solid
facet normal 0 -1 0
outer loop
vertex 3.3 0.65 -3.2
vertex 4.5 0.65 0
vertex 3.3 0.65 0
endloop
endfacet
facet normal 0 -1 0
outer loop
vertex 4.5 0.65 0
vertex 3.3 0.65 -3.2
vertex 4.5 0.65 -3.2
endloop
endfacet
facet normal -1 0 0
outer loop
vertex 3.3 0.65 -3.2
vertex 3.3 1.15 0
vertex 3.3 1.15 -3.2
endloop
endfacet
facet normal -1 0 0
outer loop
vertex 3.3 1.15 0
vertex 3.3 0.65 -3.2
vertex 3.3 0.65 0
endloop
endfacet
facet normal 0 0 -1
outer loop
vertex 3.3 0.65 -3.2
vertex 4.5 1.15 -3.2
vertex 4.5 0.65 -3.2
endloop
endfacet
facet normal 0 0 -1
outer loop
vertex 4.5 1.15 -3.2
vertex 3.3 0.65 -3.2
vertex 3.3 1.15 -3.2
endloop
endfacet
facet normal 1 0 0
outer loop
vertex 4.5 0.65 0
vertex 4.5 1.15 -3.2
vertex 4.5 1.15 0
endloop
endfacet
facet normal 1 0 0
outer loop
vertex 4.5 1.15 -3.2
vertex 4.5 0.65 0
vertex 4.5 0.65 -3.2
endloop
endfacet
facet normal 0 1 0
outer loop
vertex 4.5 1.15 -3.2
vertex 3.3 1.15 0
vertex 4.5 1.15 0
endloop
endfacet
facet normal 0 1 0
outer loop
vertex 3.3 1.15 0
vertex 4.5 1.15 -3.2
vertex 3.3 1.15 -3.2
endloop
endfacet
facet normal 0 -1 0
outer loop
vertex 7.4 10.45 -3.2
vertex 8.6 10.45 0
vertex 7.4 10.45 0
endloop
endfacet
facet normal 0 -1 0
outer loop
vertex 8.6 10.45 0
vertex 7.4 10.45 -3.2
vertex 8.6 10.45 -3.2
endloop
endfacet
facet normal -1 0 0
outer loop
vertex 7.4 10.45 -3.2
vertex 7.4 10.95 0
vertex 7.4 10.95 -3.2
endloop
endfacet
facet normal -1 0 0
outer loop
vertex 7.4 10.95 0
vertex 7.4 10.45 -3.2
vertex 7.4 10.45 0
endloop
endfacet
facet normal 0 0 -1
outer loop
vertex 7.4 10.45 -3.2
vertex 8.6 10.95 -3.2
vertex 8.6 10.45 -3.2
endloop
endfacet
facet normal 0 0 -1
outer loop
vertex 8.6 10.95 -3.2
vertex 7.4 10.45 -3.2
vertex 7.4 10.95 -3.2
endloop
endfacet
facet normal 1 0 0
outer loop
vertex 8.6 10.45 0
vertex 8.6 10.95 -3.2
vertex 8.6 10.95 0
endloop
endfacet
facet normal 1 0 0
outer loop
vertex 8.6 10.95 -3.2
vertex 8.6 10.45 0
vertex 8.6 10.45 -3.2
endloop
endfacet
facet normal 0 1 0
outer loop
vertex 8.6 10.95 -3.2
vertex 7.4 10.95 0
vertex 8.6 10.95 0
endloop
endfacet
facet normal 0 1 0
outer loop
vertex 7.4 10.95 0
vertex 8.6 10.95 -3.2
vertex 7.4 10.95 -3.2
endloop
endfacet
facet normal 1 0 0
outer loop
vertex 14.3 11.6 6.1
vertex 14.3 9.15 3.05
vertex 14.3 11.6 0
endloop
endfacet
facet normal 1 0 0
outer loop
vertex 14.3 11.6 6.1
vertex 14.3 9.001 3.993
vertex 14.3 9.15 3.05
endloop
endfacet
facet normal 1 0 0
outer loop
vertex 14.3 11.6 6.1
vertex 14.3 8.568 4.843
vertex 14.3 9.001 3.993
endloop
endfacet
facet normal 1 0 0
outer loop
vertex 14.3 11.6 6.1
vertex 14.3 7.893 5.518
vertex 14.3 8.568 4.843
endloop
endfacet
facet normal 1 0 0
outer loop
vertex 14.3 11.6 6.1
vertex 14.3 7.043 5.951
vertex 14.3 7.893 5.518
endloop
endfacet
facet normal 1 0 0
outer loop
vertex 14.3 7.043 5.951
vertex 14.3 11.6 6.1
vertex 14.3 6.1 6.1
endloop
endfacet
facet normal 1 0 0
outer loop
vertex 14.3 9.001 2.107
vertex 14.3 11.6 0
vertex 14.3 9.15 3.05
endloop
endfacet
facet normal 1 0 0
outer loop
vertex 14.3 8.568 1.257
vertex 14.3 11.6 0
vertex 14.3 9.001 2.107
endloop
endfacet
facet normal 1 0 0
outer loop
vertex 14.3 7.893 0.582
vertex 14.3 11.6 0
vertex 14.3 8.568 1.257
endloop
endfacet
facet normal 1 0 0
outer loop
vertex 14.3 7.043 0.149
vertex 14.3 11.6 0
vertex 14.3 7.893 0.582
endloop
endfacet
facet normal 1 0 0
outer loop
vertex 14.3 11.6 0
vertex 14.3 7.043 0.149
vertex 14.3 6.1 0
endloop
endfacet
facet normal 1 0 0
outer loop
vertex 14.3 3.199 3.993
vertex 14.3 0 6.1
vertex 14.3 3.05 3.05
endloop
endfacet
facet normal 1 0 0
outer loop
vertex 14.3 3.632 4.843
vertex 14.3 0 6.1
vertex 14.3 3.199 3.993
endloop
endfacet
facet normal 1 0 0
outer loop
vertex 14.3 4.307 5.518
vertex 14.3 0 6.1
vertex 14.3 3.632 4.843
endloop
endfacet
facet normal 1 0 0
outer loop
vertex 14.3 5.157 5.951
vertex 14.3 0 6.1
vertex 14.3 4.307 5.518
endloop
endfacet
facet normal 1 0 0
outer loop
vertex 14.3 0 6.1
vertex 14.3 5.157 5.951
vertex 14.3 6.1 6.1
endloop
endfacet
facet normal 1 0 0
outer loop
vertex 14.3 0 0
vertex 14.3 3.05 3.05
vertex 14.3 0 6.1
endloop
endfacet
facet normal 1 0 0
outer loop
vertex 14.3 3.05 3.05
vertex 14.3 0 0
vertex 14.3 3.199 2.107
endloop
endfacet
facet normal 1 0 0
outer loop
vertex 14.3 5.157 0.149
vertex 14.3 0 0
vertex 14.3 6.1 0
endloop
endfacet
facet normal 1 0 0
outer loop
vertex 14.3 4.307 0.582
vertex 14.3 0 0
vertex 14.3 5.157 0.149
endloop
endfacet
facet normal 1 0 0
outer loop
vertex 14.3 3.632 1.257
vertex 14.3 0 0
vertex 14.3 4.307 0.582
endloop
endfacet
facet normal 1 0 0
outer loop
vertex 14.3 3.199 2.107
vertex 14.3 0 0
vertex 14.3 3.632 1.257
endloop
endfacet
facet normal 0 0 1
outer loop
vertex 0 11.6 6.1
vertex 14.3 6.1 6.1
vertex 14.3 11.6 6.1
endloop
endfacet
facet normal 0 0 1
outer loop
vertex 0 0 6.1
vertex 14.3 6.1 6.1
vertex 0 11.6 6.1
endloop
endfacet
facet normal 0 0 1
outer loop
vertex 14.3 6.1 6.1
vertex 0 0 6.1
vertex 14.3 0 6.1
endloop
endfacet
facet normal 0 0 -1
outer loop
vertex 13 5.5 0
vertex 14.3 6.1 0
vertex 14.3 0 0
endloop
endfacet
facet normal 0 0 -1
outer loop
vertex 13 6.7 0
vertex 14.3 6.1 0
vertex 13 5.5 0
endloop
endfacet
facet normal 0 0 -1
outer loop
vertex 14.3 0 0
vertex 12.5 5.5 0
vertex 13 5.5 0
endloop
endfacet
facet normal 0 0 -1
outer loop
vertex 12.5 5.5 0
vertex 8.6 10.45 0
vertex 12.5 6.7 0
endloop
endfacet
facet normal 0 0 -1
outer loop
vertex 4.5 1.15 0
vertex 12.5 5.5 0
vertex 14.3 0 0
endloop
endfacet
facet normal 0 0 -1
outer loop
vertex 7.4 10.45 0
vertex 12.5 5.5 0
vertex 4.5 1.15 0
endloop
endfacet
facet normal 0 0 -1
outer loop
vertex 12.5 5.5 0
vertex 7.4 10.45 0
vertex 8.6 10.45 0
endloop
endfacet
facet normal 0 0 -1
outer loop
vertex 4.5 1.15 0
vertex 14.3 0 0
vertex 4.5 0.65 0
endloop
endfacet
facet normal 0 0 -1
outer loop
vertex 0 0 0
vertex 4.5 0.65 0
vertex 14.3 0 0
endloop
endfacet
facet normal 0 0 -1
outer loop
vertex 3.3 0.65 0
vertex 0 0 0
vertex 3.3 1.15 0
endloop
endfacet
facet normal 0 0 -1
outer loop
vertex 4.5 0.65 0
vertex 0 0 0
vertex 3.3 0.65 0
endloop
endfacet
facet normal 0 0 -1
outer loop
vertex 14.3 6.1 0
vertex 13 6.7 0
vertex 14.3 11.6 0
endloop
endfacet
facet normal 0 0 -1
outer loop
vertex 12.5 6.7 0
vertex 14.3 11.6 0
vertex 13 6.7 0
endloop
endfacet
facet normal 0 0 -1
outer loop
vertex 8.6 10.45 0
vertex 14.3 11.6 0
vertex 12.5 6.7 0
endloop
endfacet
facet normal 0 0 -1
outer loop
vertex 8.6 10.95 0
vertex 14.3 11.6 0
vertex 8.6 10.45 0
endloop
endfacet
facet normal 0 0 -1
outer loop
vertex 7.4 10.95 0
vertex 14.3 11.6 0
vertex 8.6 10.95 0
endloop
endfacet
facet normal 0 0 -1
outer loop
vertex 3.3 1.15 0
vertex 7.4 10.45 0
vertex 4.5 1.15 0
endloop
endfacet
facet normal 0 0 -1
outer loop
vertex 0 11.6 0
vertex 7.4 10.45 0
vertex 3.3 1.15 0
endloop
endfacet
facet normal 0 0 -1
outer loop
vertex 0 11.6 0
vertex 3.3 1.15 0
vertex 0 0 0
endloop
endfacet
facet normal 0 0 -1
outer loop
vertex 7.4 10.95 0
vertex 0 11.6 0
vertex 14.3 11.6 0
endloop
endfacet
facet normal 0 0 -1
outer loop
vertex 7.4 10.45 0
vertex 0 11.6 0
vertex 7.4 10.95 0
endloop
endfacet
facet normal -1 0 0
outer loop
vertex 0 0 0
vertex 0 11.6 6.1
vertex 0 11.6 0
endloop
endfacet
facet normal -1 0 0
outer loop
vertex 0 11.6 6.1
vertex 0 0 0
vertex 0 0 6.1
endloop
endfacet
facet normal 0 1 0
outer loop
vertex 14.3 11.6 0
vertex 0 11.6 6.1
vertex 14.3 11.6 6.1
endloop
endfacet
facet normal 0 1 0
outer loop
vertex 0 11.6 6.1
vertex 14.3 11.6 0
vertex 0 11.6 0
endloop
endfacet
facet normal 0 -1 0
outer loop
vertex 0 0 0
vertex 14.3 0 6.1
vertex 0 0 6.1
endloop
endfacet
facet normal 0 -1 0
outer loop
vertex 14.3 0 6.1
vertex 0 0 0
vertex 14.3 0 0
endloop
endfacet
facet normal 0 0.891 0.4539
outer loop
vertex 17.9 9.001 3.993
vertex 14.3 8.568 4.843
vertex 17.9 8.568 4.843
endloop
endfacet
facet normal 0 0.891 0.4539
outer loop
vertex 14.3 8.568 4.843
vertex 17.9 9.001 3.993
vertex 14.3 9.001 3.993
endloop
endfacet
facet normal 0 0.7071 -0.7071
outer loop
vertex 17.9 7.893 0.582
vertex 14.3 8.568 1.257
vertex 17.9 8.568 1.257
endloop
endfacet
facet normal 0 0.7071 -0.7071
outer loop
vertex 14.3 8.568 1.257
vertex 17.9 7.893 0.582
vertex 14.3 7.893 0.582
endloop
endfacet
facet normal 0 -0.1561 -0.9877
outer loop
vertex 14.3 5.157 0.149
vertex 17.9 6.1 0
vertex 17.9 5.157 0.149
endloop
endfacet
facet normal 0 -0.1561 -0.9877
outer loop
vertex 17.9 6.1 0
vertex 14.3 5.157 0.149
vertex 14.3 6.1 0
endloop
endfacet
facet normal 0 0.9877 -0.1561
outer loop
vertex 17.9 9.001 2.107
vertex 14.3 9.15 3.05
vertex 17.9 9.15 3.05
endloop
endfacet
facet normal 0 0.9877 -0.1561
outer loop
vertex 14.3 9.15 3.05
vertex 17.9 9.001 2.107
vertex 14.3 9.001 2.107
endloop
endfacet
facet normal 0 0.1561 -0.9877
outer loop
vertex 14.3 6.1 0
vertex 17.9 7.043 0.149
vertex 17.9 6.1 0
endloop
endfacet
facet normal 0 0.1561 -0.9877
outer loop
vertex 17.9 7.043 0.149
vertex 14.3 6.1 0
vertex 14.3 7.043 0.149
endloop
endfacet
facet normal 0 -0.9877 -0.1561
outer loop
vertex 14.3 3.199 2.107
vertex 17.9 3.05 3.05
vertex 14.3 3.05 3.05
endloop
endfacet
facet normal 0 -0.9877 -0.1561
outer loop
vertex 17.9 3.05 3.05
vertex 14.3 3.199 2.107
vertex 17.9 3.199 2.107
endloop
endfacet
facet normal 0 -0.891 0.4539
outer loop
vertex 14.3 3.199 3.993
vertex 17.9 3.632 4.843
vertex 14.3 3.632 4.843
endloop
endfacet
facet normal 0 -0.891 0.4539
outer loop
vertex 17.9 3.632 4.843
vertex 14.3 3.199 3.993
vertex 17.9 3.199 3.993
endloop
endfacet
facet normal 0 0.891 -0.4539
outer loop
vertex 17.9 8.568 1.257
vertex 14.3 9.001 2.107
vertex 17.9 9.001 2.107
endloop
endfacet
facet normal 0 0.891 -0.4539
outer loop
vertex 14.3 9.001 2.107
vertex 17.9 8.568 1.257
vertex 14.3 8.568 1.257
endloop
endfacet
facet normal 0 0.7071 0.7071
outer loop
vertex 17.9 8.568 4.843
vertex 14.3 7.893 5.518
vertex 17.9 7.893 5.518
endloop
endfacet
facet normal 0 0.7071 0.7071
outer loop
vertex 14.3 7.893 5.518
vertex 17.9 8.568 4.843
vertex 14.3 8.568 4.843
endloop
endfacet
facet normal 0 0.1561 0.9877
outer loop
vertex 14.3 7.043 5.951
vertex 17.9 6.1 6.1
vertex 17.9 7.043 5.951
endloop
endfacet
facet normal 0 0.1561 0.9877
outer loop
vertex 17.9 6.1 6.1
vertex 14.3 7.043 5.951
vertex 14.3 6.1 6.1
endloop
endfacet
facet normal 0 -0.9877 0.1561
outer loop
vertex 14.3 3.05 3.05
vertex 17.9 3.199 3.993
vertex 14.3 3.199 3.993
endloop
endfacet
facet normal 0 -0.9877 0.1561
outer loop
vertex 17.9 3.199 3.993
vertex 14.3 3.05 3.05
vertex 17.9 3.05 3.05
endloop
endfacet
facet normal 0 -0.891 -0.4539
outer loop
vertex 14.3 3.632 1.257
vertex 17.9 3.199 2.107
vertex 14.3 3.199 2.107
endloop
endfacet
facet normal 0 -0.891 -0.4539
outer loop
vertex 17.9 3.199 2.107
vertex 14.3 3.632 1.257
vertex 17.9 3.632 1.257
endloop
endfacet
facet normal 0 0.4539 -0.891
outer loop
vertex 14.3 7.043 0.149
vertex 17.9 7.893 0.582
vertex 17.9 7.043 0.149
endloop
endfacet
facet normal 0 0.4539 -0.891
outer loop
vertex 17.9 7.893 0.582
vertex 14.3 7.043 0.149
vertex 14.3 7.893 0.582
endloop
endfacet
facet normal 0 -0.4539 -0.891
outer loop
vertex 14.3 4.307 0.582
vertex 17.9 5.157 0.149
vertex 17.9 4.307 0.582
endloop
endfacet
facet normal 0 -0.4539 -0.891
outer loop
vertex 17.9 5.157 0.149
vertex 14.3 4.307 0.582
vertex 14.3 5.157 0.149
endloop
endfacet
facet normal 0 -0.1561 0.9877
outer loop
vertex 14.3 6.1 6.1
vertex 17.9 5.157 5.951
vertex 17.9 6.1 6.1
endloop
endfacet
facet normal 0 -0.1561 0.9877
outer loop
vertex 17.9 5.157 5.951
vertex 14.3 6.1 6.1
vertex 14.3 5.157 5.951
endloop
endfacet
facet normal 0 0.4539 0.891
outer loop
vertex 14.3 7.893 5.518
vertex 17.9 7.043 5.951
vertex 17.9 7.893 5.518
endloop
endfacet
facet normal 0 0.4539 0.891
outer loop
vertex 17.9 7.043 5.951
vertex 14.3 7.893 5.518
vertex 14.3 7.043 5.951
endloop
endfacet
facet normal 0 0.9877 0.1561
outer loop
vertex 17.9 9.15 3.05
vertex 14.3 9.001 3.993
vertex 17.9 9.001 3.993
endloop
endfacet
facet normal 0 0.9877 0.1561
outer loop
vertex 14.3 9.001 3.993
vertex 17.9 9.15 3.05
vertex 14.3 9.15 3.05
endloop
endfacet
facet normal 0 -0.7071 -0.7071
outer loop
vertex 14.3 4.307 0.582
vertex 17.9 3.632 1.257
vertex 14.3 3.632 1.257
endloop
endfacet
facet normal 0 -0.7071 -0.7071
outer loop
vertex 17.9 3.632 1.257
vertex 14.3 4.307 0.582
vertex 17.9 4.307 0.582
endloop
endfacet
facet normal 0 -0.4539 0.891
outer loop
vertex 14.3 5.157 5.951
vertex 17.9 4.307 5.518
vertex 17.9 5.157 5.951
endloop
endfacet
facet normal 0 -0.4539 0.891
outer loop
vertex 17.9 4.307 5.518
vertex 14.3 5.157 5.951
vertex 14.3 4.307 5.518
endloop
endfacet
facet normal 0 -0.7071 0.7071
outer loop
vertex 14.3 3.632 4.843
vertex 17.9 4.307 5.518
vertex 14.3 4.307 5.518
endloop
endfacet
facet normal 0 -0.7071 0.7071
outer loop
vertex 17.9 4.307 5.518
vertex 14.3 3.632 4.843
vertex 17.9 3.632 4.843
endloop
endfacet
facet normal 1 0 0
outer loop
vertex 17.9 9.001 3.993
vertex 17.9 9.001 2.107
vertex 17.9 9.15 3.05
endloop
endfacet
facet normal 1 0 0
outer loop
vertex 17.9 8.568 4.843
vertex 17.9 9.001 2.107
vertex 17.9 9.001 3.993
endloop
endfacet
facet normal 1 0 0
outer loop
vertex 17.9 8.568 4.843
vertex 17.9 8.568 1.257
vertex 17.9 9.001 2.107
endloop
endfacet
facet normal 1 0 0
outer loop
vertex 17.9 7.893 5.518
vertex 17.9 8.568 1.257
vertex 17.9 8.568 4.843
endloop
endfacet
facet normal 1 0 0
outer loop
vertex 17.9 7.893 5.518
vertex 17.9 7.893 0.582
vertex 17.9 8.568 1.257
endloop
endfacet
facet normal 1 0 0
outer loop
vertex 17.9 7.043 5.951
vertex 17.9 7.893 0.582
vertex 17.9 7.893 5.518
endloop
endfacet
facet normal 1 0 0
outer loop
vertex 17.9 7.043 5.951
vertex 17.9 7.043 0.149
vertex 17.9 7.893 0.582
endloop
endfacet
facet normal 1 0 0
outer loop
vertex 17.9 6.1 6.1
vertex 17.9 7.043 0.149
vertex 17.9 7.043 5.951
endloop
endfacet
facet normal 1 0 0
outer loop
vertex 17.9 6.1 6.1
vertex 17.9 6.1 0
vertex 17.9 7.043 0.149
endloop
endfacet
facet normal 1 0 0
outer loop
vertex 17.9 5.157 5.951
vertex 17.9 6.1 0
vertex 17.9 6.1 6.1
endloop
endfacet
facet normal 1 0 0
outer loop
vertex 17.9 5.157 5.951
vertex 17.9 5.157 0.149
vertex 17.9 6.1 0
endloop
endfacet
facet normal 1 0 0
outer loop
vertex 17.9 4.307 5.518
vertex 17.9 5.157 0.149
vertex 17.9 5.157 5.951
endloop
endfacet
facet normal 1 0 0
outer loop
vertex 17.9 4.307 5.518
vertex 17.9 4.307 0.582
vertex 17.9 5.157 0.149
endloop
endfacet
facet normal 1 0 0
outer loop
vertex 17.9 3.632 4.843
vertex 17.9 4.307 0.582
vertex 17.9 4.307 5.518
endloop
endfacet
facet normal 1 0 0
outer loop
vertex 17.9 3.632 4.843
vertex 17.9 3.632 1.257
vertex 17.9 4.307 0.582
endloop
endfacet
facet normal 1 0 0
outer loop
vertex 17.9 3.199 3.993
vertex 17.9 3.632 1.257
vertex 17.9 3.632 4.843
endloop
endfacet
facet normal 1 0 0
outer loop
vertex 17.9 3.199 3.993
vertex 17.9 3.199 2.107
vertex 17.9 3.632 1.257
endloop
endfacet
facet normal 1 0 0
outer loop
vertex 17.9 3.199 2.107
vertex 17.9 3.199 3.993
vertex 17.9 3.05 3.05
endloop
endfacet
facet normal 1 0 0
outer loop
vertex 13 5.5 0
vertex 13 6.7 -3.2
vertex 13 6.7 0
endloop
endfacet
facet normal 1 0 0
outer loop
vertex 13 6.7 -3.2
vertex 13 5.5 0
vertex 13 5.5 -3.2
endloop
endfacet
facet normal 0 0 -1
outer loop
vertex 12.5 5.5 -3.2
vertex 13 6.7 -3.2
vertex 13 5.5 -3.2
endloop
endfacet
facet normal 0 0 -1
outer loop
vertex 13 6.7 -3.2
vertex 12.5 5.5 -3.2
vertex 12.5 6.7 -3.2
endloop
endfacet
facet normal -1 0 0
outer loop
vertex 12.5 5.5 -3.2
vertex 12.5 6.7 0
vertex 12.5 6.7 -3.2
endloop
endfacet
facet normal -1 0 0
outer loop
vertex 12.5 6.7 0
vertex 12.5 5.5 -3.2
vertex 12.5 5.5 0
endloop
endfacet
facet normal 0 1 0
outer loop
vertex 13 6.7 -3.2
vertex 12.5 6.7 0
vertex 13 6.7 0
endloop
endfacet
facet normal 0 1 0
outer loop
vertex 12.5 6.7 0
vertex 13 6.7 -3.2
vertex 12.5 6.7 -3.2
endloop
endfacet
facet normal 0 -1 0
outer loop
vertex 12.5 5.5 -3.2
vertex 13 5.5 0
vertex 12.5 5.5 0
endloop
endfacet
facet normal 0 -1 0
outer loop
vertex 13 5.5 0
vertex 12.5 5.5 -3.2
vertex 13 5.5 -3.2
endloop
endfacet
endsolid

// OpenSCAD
/*
    OpenPaddle

    Copyright (C) 2023  Matthias Jordan

    This program is free software: you can redistribute it and/or modify
    it under the terms of the GNU General Public License as published by
    the Free Software Foundation, either version 3 of the License, or
    (at your option) any later version.

    This program is distributed in the hope that it will be useful,
    but WITHOUT ANY WARRANTY; without even the implied warranty of
    MERCHANTABILITY or FITNESS FOR A PARTICULAR PURPOSE.  See the
    GNU General Public License for more details.

    You should have received a copy of the GNU General Public License
    along with this program.  If not, see <https://www.gnu.org/licenses/>.
*/    


//////////////////////////////////////////////////////////////////////
//
//
// A TRS jack type EBS35.
//
//
//////////////////////////////////////////////////////////////////////

ebs35();

module ebs35() {
    $fn=20;
    jackcyllen=3.6;
    len=14.3;
    cube([len, 11.6, 6.1]);
    
    pinthickness=0.5;
    pinwidth=1.2;
    pinheight=3.2;
    translate([len, (11.6-5.5), 6.1/2]) rotate([0, 90, 0]) cylinder(d=6.1, h=jackcyllen);
    
    translate([0, -pinthickness/2, 0]) {
        translate([17.9-13.4, 11.6-5.5-5.2, -3.2]) rotate([0, 0, 90]) color("red") cube([pinthickness, pinwidth, pinheight+0.01]);

        translate([17.9-9.3, 11.6-5.5+4.6, -3.2]) rotate([0, 0, 90]) color("red") cube([pinthickness, pinwidth, pinheight+0.01]);


    }
    
    translate([17.9-5.4, 11.6-5.5-pinwidth/2, -3.2]) rotate([0, 0, 0]) color("red") cube([pinthickness, pinwidth, pinheight+0.01]);

}
